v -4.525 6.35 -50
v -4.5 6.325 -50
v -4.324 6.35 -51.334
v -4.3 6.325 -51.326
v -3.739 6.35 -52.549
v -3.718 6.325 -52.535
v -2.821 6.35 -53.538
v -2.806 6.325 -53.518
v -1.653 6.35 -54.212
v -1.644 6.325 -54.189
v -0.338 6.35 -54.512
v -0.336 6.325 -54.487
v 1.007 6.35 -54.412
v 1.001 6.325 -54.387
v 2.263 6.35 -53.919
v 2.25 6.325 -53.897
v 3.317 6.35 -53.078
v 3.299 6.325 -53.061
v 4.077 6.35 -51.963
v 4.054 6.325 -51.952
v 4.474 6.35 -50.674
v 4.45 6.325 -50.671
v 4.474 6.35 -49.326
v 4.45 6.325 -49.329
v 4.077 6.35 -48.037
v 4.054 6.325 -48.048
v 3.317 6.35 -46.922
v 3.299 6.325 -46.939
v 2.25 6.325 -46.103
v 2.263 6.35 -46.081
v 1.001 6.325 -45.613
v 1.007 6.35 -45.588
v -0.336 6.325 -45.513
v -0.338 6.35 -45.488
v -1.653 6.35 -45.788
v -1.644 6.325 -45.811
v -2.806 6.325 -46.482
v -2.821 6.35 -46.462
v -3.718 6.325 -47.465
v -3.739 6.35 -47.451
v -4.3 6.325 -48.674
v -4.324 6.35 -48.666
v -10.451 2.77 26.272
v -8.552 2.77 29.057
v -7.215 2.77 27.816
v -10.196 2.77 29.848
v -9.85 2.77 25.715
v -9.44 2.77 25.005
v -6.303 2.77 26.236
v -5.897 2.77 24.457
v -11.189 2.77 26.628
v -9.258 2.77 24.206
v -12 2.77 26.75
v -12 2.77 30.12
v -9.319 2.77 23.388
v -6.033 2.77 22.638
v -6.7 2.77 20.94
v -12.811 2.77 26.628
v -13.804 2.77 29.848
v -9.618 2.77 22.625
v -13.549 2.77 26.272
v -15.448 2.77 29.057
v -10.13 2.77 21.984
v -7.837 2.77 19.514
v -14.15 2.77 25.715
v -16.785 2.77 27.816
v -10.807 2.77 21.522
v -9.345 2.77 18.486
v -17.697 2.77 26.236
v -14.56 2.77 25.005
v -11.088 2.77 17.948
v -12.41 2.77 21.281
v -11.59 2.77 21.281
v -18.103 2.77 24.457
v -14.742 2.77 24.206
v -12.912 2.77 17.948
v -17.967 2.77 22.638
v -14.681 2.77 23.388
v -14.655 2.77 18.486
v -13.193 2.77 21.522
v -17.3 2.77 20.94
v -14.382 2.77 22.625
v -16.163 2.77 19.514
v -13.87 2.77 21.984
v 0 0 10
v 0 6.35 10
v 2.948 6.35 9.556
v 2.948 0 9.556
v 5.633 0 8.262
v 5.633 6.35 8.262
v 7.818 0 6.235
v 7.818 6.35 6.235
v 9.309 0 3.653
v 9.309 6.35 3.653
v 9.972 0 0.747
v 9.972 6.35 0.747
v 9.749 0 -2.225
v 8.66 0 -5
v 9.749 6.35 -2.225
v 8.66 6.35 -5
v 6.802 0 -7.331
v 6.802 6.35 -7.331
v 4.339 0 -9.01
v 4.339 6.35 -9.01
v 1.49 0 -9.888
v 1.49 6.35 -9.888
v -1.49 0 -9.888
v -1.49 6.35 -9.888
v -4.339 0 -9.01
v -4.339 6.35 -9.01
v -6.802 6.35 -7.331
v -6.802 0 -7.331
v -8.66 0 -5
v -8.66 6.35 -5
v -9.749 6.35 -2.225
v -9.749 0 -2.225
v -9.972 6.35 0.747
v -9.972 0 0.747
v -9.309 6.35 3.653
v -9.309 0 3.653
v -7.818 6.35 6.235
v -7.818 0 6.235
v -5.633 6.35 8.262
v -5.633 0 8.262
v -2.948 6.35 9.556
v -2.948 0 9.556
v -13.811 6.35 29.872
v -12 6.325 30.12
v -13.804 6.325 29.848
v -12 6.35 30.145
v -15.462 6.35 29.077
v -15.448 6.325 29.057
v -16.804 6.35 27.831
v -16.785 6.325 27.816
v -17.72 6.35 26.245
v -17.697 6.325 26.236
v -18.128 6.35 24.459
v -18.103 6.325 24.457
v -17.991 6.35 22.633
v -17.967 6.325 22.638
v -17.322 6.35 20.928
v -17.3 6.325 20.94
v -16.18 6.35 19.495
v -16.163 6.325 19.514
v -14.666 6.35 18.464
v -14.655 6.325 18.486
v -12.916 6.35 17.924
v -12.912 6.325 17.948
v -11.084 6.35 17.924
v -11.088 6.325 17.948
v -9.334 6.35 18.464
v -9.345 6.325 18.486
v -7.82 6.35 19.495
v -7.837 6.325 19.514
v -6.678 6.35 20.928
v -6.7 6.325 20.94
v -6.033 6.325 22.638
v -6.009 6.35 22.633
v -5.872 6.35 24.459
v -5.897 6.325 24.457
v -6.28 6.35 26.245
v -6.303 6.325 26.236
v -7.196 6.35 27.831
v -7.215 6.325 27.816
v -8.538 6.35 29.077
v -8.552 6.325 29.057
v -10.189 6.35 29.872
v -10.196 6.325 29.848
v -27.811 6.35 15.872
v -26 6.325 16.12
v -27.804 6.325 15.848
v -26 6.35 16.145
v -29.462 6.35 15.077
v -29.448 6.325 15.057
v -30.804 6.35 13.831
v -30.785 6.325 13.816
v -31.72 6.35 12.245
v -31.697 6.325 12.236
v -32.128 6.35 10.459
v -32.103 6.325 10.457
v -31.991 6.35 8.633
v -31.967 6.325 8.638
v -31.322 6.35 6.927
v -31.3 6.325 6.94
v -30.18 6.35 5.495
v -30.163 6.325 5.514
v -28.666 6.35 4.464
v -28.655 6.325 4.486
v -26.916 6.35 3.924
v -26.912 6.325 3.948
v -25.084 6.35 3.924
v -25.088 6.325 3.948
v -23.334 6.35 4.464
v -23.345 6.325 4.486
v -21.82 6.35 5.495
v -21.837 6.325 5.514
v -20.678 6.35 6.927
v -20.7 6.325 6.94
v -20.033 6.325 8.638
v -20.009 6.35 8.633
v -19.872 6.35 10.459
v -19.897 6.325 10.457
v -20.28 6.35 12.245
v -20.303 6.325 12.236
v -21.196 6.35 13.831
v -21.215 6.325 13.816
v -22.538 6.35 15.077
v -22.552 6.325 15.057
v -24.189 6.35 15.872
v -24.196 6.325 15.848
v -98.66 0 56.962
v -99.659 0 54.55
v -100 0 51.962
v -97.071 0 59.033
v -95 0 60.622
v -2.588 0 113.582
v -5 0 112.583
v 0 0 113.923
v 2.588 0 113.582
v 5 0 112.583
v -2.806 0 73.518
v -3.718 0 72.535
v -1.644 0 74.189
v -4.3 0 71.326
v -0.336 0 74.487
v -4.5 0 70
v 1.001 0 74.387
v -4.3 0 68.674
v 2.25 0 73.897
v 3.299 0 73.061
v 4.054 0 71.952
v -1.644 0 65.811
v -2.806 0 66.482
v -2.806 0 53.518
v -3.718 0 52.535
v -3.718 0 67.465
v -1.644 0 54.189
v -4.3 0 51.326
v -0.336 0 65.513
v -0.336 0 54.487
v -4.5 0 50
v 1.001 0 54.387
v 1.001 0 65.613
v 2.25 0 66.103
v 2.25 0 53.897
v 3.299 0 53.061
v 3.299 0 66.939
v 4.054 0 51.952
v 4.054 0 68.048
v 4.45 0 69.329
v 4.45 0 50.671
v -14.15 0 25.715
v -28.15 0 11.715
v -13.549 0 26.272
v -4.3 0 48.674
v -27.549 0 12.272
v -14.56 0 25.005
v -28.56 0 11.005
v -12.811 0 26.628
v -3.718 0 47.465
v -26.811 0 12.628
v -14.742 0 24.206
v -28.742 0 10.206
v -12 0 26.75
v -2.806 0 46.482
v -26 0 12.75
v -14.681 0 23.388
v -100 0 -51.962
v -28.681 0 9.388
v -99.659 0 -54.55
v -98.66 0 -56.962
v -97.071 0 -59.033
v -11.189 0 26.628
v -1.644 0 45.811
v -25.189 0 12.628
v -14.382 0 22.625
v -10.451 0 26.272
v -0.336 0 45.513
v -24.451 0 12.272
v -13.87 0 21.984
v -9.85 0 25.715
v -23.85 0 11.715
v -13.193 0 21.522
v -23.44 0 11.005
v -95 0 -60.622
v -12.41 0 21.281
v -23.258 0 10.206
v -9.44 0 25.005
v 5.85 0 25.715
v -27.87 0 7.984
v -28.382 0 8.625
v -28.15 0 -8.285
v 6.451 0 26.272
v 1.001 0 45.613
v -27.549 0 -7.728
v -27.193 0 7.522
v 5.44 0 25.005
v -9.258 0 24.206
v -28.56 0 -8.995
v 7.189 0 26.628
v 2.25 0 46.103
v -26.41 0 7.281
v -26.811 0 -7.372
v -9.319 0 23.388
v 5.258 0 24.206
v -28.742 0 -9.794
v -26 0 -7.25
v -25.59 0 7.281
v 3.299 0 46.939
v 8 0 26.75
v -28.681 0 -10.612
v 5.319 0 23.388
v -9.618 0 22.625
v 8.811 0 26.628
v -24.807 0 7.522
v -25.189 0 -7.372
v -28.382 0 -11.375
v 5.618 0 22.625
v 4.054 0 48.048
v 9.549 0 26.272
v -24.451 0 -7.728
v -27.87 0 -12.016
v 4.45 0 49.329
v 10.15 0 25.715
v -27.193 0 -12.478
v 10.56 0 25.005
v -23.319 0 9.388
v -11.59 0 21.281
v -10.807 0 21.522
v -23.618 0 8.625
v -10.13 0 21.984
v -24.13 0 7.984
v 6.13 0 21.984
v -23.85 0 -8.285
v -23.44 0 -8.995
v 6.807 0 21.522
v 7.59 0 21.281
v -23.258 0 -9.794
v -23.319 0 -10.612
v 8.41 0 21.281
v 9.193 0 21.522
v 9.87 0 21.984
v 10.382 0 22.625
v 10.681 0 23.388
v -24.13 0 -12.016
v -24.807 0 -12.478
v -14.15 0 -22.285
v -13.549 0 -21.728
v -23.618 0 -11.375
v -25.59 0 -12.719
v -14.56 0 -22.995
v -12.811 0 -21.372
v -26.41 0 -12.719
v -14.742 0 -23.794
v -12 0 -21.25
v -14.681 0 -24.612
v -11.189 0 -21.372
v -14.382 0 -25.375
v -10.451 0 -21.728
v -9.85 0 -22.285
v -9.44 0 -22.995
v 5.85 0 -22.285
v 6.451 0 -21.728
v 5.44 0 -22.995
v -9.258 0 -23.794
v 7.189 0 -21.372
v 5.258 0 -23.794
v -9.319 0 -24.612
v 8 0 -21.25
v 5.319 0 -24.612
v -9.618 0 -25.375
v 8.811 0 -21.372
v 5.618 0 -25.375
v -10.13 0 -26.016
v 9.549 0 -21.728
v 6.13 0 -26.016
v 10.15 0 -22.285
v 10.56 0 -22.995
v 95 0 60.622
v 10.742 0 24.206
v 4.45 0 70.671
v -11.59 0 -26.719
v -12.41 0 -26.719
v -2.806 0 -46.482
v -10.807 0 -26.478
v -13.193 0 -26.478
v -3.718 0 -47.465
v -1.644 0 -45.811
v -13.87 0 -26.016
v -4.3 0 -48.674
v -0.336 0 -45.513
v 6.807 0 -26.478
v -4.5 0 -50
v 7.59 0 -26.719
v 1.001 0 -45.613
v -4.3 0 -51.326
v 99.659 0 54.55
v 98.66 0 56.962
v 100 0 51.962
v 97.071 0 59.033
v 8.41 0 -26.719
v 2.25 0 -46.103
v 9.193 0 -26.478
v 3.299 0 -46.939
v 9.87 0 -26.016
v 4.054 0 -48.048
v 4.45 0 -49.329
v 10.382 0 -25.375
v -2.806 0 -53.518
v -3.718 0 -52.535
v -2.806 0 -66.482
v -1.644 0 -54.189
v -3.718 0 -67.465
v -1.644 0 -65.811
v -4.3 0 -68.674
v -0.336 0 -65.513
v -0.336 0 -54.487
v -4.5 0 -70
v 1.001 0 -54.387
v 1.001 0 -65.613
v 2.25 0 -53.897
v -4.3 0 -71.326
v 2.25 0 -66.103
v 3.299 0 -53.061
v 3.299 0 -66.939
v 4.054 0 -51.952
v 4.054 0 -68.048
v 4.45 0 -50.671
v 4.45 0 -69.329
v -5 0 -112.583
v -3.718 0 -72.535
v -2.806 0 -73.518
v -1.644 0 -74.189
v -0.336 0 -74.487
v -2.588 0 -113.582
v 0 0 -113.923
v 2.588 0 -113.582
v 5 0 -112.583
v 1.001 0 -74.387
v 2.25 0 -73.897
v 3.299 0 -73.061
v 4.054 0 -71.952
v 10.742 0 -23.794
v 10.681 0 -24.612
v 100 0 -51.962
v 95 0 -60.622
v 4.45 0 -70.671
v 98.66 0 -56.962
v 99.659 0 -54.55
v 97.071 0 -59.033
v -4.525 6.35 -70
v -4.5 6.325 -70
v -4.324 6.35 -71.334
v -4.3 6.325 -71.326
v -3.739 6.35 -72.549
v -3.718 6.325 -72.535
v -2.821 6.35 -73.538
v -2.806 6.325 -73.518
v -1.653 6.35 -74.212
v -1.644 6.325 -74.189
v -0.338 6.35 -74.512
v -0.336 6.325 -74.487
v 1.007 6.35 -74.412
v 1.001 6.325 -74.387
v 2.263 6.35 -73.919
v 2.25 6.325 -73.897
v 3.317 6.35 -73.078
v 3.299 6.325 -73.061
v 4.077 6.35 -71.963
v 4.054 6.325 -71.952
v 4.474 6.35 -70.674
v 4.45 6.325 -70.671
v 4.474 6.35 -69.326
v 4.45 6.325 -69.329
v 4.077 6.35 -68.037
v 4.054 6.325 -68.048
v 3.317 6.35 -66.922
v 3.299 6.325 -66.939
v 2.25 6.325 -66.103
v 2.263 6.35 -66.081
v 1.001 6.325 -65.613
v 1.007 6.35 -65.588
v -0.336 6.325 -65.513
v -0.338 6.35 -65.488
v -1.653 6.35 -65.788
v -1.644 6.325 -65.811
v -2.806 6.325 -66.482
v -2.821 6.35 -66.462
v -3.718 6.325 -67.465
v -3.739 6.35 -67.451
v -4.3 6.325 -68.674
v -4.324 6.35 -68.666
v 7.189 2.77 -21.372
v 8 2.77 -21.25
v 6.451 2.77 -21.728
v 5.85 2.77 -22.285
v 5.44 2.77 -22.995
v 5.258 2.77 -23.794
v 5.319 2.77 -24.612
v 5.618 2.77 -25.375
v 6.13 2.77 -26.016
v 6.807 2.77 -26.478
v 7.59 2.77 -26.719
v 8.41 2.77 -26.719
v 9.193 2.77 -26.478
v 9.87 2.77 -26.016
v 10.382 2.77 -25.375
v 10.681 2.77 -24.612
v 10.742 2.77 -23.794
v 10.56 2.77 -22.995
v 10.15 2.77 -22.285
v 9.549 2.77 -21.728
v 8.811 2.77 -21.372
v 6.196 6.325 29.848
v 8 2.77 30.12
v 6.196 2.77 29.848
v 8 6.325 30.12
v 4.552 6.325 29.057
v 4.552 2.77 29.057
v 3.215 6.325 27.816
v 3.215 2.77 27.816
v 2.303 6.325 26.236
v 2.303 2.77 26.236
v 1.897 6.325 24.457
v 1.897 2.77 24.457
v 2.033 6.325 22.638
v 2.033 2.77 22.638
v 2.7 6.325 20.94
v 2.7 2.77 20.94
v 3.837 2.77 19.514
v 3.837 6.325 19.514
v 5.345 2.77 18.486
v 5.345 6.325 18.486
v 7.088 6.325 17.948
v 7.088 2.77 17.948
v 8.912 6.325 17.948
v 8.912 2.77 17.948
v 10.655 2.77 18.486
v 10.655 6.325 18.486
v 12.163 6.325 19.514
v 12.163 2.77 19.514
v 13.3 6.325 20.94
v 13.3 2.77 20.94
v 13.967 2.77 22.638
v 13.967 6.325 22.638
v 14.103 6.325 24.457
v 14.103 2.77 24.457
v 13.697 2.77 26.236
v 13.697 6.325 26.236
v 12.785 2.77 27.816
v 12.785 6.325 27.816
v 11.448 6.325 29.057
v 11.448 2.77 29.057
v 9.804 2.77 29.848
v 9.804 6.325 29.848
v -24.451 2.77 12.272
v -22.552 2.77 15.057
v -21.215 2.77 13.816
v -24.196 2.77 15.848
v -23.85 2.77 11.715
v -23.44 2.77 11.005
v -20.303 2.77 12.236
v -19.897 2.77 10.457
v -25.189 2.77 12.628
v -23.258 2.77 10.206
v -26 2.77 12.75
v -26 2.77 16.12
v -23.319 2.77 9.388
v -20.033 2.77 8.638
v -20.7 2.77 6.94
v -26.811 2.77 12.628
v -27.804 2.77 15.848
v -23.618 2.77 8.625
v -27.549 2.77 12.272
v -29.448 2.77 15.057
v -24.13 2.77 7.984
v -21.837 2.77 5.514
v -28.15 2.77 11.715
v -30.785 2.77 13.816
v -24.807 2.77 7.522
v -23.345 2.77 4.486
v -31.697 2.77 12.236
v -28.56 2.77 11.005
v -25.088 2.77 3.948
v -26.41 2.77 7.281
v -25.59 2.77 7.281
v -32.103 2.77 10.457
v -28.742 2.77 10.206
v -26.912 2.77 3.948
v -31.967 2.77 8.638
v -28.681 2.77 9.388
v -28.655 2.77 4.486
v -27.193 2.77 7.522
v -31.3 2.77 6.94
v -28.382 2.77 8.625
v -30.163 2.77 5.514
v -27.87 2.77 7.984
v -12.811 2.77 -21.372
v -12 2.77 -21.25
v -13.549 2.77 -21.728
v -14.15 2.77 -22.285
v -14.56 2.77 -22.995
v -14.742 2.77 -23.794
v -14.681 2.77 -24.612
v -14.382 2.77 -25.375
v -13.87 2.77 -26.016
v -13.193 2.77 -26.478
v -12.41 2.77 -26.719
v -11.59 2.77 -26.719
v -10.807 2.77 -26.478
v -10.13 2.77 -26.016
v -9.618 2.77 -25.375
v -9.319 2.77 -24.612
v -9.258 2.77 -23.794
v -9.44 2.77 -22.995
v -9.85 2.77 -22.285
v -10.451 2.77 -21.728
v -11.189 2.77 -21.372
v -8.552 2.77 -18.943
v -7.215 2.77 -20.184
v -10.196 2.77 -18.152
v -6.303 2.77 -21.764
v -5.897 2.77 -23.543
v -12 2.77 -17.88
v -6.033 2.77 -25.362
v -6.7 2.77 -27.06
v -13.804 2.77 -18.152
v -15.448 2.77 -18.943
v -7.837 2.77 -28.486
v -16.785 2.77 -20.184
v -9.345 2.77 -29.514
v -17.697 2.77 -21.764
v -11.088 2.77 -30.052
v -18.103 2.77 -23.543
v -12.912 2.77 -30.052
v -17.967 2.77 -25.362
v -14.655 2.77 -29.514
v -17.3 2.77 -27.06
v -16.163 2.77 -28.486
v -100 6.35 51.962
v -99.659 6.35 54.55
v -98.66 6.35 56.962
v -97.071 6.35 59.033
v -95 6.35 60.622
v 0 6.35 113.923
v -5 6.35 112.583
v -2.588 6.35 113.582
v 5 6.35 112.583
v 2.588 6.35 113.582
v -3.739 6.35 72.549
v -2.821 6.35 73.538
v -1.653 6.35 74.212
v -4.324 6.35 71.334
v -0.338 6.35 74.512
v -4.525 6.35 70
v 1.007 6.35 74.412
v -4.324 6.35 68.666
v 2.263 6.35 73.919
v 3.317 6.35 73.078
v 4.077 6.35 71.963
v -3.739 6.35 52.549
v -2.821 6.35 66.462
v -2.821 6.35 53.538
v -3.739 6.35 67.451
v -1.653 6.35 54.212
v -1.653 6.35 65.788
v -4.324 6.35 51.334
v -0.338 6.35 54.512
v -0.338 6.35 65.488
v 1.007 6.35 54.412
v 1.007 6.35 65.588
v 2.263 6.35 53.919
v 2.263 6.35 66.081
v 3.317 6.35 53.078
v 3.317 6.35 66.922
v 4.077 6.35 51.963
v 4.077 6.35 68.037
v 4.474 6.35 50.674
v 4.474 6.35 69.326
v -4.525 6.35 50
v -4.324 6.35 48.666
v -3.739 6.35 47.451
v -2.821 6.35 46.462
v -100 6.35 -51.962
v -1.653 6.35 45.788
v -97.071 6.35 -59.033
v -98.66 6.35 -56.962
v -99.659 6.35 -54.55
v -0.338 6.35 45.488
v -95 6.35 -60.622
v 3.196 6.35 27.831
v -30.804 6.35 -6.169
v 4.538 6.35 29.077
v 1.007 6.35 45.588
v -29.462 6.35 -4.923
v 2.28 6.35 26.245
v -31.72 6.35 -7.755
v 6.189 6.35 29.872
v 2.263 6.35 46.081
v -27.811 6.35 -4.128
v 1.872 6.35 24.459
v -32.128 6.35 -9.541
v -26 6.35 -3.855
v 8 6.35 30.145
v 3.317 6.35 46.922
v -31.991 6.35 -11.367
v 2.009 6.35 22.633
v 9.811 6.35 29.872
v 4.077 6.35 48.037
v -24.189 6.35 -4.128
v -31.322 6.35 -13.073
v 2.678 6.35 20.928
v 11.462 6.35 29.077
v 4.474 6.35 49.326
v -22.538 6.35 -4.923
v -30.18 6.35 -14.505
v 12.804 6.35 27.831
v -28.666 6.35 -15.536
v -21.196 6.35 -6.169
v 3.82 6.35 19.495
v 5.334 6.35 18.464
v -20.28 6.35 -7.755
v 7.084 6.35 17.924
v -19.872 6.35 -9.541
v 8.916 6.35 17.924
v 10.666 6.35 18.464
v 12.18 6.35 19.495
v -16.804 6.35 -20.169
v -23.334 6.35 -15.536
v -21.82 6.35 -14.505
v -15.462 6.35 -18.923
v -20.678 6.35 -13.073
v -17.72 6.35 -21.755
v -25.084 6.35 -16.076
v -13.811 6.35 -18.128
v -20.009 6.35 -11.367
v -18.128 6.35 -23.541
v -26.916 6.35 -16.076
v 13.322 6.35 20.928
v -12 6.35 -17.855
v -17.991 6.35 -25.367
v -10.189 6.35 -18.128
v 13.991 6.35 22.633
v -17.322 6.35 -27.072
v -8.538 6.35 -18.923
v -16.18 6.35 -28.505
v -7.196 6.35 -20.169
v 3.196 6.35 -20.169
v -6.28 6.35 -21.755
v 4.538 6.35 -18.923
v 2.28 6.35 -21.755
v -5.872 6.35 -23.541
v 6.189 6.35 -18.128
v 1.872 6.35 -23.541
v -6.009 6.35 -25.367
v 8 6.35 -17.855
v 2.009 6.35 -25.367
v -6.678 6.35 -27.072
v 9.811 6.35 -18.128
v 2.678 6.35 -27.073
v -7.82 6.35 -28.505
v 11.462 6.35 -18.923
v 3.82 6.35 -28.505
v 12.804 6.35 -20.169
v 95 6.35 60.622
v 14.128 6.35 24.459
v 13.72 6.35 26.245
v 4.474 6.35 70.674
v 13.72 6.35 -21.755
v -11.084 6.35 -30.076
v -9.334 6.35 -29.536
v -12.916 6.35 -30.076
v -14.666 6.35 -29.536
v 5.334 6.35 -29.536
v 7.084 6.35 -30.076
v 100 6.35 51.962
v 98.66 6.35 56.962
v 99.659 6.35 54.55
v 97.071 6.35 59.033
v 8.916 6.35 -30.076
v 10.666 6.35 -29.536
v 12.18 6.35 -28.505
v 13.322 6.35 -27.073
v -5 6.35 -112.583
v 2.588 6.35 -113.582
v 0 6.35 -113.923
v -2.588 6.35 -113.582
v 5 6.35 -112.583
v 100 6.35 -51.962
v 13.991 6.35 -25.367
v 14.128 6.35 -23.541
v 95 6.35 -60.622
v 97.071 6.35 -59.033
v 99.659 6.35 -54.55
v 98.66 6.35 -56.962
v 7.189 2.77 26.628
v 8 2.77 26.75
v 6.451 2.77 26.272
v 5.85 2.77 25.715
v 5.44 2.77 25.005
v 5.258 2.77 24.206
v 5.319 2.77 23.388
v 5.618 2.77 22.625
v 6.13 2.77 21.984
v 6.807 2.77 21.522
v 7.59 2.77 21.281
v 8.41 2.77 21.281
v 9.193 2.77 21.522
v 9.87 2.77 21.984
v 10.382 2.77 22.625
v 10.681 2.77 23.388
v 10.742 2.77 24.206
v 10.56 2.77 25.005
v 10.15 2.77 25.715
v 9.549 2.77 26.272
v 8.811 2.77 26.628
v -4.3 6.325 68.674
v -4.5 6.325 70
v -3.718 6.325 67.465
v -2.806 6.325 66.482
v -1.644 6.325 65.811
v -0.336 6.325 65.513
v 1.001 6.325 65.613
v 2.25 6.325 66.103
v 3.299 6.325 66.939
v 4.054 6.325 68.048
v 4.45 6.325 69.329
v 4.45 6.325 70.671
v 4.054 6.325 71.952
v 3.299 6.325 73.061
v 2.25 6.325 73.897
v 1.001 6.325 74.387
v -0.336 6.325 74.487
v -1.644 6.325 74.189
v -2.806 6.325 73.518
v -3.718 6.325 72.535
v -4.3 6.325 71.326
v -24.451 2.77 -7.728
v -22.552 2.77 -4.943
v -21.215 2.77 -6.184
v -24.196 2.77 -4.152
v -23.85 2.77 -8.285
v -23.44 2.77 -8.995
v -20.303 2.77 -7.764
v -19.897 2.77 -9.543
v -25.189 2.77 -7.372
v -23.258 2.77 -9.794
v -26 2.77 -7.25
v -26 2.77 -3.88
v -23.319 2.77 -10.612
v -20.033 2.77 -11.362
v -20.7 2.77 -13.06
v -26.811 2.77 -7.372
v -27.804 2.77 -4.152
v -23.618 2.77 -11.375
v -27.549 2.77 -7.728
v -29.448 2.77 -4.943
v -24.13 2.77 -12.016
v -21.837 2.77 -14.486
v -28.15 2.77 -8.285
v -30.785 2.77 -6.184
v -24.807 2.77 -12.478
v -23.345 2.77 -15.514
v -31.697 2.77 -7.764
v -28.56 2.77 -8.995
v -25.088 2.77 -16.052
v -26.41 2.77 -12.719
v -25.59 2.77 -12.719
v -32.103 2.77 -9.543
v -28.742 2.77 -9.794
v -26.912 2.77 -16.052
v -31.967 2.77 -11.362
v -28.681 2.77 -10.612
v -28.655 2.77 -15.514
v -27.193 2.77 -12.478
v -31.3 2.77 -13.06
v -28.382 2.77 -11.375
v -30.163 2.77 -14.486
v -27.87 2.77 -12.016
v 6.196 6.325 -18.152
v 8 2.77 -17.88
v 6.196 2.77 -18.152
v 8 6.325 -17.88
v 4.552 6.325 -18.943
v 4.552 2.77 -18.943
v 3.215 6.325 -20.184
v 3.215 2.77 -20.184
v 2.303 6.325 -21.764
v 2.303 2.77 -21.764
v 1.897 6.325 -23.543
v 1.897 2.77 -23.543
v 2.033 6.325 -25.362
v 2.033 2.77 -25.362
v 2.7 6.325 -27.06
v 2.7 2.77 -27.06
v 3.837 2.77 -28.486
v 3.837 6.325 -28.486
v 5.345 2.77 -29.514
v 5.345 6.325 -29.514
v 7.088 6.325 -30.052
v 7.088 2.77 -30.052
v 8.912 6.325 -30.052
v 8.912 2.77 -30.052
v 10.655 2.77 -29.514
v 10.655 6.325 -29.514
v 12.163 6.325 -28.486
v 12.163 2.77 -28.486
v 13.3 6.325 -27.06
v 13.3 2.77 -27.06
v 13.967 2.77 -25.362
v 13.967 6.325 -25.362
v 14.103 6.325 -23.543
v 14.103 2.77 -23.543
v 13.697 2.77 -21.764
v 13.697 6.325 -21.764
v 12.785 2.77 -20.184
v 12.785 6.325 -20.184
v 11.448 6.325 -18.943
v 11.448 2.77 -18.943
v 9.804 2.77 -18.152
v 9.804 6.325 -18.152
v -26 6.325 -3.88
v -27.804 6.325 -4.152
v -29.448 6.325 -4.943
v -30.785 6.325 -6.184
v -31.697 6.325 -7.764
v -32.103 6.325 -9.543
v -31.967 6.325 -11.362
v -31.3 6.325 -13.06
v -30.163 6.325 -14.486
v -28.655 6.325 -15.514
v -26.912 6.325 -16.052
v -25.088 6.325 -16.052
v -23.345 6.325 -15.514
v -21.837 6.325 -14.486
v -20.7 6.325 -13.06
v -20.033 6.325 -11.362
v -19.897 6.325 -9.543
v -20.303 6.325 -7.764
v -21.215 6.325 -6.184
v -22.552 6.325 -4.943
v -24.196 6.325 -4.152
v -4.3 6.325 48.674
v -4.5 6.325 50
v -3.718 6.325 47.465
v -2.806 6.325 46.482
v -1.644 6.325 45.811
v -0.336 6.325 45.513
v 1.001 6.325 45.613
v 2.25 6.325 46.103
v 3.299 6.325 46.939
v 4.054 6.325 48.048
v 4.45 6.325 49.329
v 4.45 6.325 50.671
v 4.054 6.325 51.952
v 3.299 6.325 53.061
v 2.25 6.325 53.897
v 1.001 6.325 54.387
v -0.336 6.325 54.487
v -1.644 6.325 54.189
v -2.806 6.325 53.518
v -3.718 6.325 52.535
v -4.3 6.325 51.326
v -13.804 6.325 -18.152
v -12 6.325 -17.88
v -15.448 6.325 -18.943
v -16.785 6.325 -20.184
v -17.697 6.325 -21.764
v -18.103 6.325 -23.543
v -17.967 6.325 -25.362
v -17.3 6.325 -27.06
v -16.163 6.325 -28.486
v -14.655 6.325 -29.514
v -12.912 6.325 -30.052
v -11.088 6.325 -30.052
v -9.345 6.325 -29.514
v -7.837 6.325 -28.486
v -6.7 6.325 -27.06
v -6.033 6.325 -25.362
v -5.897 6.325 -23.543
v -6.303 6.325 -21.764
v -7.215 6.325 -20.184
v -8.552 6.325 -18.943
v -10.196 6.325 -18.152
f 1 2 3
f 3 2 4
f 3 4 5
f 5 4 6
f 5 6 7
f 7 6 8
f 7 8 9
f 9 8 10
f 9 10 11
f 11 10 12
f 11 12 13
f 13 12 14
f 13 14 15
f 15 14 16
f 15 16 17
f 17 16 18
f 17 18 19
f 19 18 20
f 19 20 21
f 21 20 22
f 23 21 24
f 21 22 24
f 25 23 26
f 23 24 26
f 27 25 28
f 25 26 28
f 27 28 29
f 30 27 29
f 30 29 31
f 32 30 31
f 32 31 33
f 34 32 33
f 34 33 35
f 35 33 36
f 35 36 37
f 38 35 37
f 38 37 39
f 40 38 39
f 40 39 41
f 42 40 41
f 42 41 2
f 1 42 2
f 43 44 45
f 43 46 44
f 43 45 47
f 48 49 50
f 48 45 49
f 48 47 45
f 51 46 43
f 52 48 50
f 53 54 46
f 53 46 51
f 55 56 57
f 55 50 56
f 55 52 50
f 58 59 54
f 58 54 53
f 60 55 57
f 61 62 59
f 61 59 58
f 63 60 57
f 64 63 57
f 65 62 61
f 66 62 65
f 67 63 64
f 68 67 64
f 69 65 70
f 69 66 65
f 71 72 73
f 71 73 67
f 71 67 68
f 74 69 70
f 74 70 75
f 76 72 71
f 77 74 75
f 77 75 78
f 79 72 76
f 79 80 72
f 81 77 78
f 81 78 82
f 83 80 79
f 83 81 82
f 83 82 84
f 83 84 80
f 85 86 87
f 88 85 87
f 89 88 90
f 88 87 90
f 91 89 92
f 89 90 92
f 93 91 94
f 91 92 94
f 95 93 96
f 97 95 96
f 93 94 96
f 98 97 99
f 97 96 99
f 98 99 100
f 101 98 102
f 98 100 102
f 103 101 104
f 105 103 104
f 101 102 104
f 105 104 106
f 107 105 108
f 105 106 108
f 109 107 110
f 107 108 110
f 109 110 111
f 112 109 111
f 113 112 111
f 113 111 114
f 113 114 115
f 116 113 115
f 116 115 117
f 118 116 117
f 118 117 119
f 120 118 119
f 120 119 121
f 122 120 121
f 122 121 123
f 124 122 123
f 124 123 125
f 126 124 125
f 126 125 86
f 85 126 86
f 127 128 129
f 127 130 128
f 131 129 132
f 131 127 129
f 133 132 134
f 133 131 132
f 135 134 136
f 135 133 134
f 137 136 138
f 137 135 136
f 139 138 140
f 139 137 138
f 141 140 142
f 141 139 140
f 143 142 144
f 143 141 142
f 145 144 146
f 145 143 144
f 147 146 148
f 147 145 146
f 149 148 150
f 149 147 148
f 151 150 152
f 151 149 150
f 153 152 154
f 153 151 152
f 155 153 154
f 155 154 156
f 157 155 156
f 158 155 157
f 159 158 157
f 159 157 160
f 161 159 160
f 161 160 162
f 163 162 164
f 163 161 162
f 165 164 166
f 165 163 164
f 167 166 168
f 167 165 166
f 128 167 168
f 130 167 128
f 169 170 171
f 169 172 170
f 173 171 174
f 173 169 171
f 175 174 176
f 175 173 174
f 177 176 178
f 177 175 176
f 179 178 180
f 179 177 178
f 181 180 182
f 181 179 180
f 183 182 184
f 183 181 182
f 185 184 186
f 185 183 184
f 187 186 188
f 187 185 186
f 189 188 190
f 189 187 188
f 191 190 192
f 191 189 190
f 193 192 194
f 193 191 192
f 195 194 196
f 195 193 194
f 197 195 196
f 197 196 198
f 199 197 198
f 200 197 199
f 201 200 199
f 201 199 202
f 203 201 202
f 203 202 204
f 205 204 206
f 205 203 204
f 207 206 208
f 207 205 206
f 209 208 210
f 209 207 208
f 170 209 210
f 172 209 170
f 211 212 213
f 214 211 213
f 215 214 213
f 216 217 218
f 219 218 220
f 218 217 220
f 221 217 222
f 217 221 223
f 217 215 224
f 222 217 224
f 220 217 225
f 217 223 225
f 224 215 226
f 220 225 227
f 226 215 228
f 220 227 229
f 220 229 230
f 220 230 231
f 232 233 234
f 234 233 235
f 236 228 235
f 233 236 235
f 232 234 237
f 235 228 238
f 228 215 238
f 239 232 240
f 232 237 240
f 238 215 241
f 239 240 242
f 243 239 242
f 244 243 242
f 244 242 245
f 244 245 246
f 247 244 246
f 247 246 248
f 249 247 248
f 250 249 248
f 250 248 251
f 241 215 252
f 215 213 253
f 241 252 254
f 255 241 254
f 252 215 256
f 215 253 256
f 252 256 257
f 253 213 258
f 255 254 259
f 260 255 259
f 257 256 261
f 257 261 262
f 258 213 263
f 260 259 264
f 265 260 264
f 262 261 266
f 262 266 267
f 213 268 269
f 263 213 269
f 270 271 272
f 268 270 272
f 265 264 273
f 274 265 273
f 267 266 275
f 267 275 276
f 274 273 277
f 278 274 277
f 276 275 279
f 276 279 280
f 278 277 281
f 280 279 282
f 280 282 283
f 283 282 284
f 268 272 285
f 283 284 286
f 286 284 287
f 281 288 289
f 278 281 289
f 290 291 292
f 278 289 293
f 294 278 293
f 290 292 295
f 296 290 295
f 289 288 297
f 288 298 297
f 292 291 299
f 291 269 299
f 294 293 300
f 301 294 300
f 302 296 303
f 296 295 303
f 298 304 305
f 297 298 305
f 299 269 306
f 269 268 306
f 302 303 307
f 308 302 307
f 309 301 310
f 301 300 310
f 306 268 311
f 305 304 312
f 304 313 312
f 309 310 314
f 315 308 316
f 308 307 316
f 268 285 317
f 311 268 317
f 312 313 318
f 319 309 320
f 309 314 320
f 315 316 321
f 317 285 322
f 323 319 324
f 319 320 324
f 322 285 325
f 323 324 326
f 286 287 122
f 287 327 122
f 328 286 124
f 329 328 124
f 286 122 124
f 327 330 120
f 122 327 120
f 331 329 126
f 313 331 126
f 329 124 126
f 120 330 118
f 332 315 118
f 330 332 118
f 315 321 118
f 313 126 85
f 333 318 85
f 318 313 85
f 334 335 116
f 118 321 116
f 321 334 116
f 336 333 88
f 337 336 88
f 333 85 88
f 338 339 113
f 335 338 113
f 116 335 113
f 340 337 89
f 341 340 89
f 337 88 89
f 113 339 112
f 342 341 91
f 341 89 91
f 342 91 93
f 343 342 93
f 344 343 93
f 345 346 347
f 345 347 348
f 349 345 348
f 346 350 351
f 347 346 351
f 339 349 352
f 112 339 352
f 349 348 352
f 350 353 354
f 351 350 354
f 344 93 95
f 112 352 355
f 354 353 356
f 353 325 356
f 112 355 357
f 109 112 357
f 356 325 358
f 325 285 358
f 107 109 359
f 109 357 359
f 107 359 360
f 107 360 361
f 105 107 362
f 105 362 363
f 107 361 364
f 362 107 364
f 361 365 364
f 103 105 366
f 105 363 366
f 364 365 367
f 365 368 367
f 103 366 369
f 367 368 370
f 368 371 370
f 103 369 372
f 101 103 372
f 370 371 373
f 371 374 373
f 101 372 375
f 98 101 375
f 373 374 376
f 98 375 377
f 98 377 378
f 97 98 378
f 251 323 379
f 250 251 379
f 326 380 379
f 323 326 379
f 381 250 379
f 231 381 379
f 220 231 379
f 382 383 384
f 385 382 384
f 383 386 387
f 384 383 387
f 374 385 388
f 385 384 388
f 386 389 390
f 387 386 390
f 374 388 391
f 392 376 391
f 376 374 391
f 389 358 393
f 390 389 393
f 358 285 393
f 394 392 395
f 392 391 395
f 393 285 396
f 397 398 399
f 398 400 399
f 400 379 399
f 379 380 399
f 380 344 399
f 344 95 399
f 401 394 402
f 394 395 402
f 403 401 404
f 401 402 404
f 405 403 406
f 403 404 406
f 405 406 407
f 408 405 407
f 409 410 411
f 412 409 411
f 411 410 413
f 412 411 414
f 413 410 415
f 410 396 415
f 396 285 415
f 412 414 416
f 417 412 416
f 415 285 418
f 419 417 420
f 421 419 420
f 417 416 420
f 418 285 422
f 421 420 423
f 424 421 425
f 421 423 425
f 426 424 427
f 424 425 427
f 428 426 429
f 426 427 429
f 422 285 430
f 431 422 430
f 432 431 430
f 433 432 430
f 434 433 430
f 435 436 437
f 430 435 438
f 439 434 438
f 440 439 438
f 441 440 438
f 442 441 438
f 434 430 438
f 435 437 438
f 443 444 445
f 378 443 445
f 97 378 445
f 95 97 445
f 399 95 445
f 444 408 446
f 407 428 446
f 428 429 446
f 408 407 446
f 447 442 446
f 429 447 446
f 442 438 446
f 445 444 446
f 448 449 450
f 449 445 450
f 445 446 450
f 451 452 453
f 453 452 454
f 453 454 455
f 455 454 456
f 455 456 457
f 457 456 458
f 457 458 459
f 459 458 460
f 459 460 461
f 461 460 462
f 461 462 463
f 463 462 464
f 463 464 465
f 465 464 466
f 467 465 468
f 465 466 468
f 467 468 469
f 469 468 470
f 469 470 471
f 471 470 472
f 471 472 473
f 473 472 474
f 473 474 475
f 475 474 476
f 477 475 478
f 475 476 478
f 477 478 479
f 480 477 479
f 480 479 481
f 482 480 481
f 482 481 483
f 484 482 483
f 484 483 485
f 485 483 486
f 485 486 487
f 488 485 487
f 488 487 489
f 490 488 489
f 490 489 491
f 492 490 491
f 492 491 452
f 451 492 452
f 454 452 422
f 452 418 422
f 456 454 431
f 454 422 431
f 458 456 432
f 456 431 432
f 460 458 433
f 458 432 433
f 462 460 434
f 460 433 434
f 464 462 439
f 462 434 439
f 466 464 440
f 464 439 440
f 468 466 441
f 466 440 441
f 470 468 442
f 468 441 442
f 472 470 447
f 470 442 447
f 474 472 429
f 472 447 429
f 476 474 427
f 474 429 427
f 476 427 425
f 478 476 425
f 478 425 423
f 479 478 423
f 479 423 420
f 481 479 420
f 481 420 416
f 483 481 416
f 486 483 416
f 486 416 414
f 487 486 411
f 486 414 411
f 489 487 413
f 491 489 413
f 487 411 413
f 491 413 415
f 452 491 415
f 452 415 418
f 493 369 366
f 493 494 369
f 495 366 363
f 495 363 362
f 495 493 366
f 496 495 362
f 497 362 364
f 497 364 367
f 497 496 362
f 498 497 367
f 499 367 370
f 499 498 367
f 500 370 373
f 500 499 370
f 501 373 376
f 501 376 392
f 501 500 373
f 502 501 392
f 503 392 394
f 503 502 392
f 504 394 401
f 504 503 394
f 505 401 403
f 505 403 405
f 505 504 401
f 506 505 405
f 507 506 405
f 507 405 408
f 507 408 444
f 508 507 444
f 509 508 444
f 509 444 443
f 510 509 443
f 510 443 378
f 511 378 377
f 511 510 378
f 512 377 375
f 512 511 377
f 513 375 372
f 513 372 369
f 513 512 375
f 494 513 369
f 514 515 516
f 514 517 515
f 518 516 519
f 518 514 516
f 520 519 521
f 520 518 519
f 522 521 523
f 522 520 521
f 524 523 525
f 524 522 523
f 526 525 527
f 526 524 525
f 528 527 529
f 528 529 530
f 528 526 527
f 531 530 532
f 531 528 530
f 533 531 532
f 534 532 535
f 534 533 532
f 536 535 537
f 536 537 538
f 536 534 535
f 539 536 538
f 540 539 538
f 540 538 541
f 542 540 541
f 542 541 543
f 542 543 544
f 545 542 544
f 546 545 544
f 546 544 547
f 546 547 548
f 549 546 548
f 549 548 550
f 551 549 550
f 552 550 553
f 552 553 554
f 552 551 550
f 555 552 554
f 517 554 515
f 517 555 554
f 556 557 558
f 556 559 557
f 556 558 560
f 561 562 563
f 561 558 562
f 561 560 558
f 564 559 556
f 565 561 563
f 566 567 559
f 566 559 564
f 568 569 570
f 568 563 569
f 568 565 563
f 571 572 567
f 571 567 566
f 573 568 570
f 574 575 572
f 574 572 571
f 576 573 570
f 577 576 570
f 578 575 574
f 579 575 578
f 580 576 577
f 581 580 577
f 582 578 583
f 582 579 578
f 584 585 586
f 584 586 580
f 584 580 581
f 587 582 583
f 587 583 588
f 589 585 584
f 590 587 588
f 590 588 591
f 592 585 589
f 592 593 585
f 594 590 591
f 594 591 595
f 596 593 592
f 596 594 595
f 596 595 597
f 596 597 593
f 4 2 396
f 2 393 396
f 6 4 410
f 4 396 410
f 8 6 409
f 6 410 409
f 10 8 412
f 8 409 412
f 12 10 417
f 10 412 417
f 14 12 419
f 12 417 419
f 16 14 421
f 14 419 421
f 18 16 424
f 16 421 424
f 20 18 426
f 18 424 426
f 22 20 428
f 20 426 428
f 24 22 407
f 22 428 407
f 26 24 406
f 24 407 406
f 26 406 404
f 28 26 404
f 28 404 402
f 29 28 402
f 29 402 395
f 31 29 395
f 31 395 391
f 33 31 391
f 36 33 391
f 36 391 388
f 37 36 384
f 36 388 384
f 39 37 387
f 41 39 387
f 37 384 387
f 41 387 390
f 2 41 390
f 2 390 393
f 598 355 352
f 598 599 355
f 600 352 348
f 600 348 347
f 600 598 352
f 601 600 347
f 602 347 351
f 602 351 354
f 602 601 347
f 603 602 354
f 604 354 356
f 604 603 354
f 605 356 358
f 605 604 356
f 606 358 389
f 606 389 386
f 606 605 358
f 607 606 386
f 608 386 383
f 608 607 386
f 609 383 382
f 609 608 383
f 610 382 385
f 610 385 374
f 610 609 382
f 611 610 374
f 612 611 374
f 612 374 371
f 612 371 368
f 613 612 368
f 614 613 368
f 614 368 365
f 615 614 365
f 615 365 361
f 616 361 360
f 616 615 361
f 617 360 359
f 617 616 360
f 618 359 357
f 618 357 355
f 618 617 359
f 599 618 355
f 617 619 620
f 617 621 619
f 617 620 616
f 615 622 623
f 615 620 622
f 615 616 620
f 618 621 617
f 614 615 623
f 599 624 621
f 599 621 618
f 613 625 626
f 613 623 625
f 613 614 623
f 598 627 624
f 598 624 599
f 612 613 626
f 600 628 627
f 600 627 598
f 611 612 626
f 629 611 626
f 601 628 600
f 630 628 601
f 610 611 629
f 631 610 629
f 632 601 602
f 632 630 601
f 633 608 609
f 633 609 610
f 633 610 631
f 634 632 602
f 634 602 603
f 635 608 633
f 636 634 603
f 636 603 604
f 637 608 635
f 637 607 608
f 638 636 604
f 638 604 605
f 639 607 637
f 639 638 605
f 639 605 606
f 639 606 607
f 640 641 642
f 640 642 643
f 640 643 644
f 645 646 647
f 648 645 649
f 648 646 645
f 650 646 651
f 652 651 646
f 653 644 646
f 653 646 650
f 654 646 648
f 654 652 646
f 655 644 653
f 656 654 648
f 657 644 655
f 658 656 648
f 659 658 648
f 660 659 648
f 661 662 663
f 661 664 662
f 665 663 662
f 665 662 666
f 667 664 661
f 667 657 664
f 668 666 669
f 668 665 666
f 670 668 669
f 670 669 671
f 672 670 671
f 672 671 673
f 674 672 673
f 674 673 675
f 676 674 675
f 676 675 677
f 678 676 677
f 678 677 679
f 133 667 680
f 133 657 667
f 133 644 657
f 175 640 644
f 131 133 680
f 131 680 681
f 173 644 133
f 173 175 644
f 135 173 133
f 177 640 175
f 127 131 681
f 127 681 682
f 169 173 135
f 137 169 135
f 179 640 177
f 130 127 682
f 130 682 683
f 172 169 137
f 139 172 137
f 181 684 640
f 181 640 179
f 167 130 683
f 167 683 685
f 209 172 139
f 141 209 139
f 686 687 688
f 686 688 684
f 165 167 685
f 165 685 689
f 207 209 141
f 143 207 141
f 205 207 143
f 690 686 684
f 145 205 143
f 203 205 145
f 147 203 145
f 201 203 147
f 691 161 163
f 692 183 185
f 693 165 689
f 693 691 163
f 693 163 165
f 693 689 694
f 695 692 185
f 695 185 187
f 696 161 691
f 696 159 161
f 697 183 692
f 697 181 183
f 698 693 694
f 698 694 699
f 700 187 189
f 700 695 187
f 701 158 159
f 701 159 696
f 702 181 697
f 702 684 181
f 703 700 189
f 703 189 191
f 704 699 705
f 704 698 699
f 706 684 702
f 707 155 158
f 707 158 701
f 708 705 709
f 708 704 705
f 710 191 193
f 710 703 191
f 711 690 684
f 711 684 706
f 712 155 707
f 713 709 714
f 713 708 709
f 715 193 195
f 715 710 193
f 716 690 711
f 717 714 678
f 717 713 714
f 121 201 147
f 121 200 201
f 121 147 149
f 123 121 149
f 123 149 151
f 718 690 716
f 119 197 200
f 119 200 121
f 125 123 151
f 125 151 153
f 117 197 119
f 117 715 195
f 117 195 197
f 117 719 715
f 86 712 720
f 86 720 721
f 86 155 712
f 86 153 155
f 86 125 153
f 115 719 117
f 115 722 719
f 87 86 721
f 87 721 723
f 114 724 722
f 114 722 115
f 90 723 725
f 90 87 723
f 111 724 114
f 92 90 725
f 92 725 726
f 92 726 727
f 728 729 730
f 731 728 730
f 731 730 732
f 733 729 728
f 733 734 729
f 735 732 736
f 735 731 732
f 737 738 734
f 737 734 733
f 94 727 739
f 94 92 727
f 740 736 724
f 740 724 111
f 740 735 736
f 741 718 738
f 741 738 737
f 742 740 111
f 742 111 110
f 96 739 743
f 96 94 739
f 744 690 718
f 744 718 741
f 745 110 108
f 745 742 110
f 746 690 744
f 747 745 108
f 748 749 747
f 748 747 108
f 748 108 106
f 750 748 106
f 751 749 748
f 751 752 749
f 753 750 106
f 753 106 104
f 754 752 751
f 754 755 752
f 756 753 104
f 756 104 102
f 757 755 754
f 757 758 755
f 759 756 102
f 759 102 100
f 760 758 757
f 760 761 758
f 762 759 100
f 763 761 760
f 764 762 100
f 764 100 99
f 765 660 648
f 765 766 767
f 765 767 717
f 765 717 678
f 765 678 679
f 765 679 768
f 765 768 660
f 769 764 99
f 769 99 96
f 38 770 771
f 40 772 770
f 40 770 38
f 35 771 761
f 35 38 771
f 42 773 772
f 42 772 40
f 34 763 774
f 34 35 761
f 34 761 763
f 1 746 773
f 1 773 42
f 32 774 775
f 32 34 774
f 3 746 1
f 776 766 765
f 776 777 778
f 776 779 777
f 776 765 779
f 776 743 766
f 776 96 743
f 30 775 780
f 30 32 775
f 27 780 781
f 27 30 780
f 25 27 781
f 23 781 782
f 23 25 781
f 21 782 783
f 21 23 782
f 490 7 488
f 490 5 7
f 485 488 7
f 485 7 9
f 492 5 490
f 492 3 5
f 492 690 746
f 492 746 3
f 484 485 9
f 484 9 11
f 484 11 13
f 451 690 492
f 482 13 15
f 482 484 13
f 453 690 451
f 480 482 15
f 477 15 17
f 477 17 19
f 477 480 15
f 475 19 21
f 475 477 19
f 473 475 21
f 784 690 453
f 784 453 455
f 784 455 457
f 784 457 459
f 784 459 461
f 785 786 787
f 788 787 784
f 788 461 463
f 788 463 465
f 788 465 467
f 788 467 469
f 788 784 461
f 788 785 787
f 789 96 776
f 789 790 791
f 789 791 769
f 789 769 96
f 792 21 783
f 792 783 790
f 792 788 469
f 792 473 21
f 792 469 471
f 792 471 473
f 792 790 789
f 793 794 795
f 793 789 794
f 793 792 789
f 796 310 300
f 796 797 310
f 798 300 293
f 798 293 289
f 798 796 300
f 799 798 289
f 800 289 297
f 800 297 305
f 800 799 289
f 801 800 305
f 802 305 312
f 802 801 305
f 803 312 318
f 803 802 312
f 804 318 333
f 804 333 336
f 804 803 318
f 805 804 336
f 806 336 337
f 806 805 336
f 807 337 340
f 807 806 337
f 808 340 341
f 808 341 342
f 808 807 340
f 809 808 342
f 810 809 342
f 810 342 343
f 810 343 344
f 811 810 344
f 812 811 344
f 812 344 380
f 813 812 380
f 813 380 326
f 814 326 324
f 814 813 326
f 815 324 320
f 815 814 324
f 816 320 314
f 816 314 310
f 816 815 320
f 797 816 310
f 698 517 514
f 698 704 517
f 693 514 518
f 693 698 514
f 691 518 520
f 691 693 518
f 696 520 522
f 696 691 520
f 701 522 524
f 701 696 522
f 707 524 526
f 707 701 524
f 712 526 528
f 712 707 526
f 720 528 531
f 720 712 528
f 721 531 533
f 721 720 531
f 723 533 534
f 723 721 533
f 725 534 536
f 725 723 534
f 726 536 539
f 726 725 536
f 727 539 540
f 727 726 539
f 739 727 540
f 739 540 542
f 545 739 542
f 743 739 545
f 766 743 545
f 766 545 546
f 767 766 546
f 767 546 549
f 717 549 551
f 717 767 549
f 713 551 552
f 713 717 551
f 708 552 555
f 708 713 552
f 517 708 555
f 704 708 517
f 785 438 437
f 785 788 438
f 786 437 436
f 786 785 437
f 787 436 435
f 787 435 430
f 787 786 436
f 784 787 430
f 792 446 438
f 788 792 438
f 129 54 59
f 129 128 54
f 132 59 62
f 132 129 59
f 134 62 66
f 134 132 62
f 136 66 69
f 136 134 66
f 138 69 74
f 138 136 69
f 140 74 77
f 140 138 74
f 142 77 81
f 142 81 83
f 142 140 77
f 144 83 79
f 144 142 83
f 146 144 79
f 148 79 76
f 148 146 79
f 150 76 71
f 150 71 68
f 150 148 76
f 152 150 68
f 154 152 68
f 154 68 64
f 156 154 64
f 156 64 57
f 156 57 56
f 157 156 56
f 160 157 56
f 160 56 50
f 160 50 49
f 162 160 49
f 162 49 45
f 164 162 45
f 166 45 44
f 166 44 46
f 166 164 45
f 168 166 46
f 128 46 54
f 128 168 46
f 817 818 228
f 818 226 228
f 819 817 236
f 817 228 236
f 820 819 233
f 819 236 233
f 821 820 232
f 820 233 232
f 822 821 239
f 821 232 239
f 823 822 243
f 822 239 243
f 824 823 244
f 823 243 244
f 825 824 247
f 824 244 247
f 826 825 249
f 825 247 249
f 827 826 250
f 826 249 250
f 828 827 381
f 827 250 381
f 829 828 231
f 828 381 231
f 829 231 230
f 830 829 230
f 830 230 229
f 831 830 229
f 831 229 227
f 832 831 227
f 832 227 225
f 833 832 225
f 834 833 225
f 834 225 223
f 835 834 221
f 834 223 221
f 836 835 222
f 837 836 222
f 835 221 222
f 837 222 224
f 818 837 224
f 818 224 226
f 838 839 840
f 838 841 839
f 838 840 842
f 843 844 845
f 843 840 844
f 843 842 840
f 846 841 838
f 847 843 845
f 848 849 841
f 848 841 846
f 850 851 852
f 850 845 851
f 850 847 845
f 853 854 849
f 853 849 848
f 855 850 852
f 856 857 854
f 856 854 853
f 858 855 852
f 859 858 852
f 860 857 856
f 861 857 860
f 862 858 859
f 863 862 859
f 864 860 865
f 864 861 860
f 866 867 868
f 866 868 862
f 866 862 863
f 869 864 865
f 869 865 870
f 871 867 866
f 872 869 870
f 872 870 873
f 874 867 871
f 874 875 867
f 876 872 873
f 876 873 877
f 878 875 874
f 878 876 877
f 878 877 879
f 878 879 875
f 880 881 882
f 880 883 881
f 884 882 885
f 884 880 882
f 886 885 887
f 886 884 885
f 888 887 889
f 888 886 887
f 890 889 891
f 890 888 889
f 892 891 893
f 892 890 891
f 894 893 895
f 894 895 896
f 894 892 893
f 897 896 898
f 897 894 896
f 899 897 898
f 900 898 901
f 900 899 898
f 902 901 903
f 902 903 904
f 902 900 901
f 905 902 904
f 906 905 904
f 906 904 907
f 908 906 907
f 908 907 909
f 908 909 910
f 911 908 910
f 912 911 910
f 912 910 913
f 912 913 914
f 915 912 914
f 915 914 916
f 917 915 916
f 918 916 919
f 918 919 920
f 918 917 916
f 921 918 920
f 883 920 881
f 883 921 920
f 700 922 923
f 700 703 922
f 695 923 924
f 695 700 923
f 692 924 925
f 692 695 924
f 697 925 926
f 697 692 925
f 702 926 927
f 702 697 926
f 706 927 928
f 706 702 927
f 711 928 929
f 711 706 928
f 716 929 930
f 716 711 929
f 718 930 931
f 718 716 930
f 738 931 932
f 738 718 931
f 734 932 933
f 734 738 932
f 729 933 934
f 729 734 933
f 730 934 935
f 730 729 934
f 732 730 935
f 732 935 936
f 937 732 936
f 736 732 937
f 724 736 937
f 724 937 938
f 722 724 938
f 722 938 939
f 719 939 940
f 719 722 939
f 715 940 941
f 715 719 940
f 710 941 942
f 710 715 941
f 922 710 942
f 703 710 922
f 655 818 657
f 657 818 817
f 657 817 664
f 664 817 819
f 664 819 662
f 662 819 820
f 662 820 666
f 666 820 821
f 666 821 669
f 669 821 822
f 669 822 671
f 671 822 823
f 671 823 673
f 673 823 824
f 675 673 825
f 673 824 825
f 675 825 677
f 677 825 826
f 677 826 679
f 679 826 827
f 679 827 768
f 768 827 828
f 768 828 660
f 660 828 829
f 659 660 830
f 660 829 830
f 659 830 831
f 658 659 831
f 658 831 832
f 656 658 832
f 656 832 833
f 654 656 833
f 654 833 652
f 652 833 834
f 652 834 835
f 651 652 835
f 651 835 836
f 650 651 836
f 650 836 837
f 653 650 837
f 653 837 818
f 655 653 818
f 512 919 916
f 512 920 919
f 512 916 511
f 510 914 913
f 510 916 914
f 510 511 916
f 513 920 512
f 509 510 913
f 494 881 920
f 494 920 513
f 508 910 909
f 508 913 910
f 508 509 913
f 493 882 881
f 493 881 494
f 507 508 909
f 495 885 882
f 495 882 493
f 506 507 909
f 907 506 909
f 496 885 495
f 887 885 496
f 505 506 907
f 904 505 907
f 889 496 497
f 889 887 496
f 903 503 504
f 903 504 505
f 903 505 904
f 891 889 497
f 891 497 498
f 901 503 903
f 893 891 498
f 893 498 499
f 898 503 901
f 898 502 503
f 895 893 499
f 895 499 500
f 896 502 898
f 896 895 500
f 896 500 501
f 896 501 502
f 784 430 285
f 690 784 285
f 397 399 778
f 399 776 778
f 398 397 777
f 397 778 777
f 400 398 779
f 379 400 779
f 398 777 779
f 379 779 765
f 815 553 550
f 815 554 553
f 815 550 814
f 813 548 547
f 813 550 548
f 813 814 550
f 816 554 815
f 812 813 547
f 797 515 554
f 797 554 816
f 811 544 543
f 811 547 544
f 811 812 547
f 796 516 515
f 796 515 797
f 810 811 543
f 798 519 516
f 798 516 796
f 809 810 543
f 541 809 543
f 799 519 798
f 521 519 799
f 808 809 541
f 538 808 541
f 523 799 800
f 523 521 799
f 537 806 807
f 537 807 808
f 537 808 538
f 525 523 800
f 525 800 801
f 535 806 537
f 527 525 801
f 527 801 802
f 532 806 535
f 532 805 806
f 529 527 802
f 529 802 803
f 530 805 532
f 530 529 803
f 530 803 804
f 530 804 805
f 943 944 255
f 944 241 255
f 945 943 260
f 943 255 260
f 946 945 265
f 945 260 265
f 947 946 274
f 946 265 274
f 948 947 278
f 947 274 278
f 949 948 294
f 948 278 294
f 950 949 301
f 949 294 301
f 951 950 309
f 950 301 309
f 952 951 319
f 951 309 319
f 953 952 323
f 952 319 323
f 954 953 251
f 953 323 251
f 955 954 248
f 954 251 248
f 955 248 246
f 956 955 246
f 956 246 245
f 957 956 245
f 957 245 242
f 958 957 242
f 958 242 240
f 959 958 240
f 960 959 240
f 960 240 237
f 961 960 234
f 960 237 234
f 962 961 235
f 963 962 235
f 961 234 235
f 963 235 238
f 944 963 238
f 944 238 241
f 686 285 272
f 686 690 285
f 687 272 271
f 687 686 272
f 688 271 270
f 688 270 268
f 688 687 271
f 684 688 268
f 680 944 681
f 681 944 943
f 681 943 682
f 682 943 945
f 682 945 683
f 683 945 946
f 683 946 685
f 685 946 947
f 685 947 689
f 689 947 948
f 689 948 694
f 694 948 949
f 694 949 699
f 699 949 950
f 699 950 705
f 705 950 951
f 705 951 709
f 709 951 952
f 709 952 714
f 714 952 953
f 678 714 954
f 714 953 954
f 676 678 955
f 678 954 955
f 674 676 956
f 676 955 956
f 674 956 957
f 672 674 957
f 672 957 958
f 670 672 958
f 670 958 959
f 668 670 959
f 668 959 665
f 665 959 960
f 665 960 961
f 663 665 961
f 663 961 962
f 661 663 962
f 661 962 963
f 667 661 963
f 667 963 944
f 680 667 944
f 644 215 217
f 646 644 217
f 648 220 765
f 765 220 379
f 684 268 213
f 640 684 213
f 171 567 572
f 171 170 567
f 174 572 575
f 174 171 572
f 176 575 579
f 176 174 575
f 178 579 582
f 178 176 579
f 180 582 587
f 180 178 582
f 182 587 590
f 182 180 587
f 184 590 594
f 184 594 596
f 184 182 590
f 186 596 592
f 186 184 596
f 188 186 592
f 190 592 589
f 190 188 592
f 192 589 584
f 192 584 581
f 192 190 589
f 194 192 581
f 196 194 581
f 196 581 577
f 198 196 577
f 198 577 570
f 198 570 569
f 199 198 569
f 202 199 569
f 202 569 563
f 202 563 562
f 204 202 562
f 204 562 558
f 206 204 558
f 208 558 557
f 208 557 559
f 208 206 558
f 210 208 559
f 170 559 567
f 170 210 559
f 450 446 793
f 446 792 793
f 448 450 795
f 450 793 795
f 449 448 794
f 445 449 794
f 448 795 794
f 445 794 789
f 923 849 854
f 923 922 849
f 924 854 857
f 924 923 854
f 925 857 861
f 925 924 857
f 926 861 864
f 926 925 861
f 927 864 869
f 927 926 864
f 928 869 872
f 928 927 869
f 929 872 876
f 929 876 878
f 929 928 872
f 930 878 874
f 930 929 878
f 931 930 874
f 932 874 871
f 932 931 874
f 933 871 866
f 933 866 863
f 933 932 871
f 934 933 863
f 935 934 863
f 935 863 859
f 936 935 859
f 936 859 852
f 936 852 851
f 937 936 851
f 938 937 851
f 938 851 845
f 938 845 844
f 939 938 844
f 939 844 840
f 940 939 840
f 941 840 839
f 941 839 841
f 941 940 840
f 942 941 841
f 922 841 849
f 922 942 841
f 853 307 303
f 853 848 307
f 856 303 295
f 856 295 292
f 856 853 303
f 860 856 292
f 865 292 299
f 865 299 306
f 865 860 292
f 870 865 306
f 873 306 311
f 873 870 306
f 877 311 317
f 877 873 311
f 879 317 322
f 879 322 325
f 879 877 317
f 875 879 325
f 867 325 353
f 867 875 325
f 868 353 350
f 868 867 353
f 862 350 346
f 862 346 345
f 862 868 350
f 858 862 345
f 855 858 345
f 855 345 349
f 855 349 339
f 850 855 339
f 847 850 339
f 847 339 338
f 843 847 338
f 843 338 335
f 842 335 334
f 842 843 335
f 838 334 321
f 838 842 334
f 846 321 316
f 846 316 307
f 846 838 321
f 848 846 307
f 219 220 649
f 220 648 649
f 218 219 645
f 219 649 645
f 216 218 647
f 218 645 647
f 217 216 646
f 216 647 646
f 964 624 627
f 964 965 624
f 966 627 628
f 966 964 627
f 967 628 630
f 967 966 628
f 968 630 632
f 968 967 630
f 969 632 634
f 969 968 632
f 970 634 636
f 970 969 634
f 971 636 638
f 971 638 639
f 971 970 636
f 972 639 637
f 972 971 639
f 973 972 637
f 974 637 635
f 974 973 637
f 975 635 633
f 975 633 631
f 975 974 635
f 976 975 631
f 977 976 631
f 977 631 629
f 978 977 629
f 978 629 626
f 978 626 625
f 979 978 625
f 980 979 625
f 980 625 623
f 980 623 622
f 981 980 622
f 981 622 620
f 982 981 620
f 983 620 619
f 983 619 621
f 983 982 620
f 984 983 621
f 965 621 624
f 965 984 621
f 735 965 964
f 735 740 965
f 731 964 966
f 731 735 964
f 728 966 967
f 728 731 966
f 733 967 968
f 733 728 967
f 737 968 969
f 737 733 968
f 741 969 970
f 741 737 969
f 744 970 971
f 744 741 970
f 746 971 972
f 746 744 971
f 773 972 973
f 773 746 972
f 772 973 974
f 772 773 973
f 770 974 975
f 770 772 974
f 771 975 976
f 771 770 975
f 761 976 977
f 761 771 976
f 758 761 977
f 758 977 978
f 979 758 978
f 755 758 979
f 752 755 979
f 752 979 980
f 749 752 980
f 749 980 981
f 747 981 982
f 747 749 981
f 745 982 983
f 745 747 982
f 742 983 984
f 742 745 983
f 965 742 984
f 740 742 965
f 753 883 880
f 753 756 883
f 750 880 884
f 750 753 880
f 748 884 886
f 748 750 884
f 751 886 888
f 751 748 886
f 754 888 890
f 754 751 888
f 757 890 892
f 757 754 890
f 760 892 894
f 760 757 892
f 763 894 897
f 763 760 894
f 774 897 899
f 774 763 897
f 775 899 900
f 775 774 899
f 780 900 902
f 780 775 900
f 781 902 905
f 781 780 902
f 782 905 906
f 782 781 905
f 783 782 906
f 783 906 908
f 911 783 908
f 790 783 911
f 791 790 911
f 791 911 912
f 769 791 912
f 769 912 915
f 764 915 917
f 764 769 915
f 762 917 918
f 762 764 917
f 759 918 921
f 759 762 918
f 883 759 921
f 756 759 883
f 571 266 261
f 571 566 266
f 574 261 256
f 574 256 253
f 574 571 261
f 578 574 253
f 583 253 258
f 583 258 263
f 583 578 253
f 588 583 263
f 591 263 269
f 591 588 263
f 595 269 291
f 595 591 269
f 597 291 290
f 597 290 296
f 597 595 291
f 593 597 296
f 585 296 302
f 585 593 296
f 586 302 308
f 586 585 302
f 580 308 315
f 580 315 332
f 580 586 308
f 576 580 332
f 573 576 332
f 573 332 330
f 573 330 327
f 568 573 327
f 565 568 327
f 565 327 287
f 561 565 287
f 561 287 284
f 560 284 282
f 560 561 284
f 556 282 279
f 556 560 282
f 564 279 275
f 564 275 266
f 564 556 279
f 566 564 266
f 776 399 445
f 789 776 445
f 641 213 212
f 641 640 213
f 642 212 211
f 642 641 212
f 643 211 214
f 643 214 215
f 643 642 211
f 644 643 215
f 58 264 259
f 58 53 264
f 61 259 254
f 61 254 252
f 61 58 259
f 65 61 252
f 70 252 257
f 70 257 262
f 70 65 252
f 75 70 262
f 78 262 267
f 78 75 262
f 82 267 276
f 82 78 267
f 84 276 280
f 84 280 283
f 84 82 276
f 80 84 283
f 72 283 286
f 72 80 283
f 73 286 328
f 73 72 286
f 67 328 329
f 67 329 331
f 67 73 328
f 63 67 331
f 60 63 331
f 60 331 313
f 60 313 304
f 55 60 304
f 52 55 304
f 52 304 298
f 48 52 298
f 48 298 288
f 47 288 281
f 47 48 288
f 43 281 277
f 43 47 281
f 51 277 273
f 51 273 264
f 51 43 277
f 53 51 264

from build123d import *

# Parameters (mm, degrees)
BOSS_EXTRUDE1_DEPTH                    = 6.35
SKETCH2_R                              = 10
CUT_EXTRUDE1_DEPTH                     = 153.884452556
M8_CLEARANCE_HOLE1_D                   = 9
M8_CLEARANCE_HOLE1_CSINK_D             = 9.05
M8_CLEARANCE_HOLE1_CSINK_ANGLE         = 90
CBORE_FOR_M5_HEX_HEAD_BOLT1_AT_2_COUNT = 2
CBORE_FOR_M5_HEX_HEAD_BOLT1_AT_2_PITCH = 19.798989873
CBORE_FOR_M5_HEX_HEAD_BOLT1_AT_3_COUNT = 2
CBORE_FOR_M5_HEX_HEAD_BOLT1_AT_3_PITCH = 36.769552622
CBORE_FOR_M5_HEX_HEAD_BOLT1_AT_4_COUNT = 2
CBORE_FOR_M5_HEX_HEAD_BOLT1_AT_4_PITCH = 20
CBORE_FOR_M5_HEX_HEAD_BOLT1_AT_5_COUNT = 2
CBORE_FOR_M5_HEX_HEAD_BOLT1_AT_5_PITCH = 36.769552622
CBORE_FOR_M5_HEX_HEAD_BOLT1_AT_6_COUNT = 2
CBORE_FOR_M5_HEX_HEAD_BOLT1_AT_6_PITCH = 48.083261121
FILLET1_R                              = 10


with BuildPart() as part:
    # Sketch1 → Boss-Extrude1 (new body)
    with BuildSketch(Plane(origin=(0, 0, 0), x_dir=(1, 0, 0), z_dir=(0, 1, 0))):
        Polygon((100, 57.735026919), (0, 115.470053838), (-100, 57.735026919), (-100, -57.735026919), (0, -115.470053838), (100, -57.735026919), align=None)
    extrude(amount=BOSS_EXTRUDE1_DEPTH)

    # Sketch2 → Cut-Extrude1 (cut, through all)
    with BuildSketch(Plane(origin=(0, 6.35, 0), x_dir=(1, 0, 0), z_dir=(0, 1, 0))):
        with Locations(Location((0, 0, 0), (0, 0, 270))):
            Circle(SKETCH2_R)
    extrude(amount=-CUT_EXTRUDE1_DEPTH, mode=Mode.SUBTRACT)

    # M8 Clearance Hole1 (through all)
    with Locations(Plane(origin=(0, 6.35, 0), x_dir=(1, 0, 0), z_dir=(0, 1, 0))):
        with Locations((0, 70), (0, 50), (0, -50), (0, -70)):
            CounterSinkHole(M8_CLEARANCE_HOLE1_D / 2, M8_CLEARANCE_HOLE1_CSINK_D / 2, counter_sink_angle=M8_CLEARANCE_HOLE1_CSINK_ANGLE)

    # Sketch8 → CBORE for M5 Hex Head Bolt1 (revolve, cut)
    with BuildSketch(Plane(origin=(-26, 6.35, -10), x_dir=(0, 0, 1), z_dir=(1, 0, 0))):
        Polygon((0, 0), (0, 6.35), (2.75, 6.35), (2.75, 3.58), (6.12, 3.58), (6.12, 0.025), (6.145, 0), align=None)
    cbore_for_m5_hex_head_bolt1 = revolve(axis=Axis((-26, 12.7, -10), (0, -1, 0)), mode=Mode.SUBTRACT)

    # CBORE for M5 Hex Head Bolt1 at 2: CBORE for M5 Hex Head Bolt1 ×2
    with Locations(*[Vector(0.7071067811865476, 0, -0.7071067811865476) * (i * CBORE_FOR_M5_HEX_HEAD_BOLT1_AT_2_PITCH) for i in range(1, CBORE_FOR_M5_HEX_HEAD_BOLT1_AT_2_COUNT)]):
        add(cbore_for_m5_hex_head_bolt1, mode=Mode.SUBTRACT)

    # CBORE for M5 Hex Head Bolt1 at 3: CBORE for M5 Hex Head Bolt1 ×2
    with Locations(*[Vector(0.924678098474716, 0, -0.38074980525429486) * (i * CBORE_FOR_M5_HEX_HEAD_BOLT1_AT_3_PITCH) for i in range(1, CBORE_FOR_M5_HEX_HEAD_BOLT1_AT_3_COUNT)]):
        add(cbore_for_m5_hex_head_bolt1, mode=Mode.SUBTRACT)

    # CBORE for M5 Hex Head Bolt1 at 4: CBORE for M5 Hex Head Bolt1 ×2
    with Locations(*[(0, 0, i * CBORE_FOR_M5_HEX_HEAD_BOLT1_AT_4_PITCH) for i in range(1, CBORE_FOR_M5_HEX_HEAD_BOLT1_AT_4_COUNT)]):
        add(cbore_for_m5_hex_head_bolt1, mode=Mode.SUBTRACT)

    # CBORE for M5 Hex Head Bolt1 at 5: CBORE for M5 Hex Head Bolt1 ×2
    with Locations(*[Vector(0.38074980525429486, 0, 0.924678098474716) * (i * CBORE_FOR_M5_HEX_HEAD_BOLT1_AT_5_PITCH) for i in range(1, CBORE_FOR_M5_HEX_HEAD_BOLT1_AT_5_COUNT)]):
        add(cbore_for_m5_hex_head_bolt1, mode=Mode.SUBTRACT)

    # CBORE for M5 Hex Head Bolt1 at 6: CBORE for M5 Hex Head Bolt1 ×2
    with Locations(*[Vector(0.7071067811865476, 0, 0.7071067811865476) * (i * CBORE_FOR_M5_HEX_HEAD_BOLT1_AT_6_PITCH) for i in range(1, CBORE_FOR_M5_HEX_HEAD_BOLT1_AT_6_COUNT)]):
        add(cbore_for_m5_hex_head_bolt1, mode=Mode.SUBTRACT)

    # Fillet1
    fillet1_edges = [part.edges().sort_by_distance(p)[0] for p in [
        (100, 3.175, 57.735026919),
        (0, 3.175, 115.470053838),
        (-100, 3.175, 57.735026919),
        (-100, 3.175, -57.735026919),
        (0, 3.175, -115.470053838),
        (100, 3.175, -57.735026919),
    ]]
    fillet(fillet1_edges, radius=FILLET1_R)


solid = part.part
